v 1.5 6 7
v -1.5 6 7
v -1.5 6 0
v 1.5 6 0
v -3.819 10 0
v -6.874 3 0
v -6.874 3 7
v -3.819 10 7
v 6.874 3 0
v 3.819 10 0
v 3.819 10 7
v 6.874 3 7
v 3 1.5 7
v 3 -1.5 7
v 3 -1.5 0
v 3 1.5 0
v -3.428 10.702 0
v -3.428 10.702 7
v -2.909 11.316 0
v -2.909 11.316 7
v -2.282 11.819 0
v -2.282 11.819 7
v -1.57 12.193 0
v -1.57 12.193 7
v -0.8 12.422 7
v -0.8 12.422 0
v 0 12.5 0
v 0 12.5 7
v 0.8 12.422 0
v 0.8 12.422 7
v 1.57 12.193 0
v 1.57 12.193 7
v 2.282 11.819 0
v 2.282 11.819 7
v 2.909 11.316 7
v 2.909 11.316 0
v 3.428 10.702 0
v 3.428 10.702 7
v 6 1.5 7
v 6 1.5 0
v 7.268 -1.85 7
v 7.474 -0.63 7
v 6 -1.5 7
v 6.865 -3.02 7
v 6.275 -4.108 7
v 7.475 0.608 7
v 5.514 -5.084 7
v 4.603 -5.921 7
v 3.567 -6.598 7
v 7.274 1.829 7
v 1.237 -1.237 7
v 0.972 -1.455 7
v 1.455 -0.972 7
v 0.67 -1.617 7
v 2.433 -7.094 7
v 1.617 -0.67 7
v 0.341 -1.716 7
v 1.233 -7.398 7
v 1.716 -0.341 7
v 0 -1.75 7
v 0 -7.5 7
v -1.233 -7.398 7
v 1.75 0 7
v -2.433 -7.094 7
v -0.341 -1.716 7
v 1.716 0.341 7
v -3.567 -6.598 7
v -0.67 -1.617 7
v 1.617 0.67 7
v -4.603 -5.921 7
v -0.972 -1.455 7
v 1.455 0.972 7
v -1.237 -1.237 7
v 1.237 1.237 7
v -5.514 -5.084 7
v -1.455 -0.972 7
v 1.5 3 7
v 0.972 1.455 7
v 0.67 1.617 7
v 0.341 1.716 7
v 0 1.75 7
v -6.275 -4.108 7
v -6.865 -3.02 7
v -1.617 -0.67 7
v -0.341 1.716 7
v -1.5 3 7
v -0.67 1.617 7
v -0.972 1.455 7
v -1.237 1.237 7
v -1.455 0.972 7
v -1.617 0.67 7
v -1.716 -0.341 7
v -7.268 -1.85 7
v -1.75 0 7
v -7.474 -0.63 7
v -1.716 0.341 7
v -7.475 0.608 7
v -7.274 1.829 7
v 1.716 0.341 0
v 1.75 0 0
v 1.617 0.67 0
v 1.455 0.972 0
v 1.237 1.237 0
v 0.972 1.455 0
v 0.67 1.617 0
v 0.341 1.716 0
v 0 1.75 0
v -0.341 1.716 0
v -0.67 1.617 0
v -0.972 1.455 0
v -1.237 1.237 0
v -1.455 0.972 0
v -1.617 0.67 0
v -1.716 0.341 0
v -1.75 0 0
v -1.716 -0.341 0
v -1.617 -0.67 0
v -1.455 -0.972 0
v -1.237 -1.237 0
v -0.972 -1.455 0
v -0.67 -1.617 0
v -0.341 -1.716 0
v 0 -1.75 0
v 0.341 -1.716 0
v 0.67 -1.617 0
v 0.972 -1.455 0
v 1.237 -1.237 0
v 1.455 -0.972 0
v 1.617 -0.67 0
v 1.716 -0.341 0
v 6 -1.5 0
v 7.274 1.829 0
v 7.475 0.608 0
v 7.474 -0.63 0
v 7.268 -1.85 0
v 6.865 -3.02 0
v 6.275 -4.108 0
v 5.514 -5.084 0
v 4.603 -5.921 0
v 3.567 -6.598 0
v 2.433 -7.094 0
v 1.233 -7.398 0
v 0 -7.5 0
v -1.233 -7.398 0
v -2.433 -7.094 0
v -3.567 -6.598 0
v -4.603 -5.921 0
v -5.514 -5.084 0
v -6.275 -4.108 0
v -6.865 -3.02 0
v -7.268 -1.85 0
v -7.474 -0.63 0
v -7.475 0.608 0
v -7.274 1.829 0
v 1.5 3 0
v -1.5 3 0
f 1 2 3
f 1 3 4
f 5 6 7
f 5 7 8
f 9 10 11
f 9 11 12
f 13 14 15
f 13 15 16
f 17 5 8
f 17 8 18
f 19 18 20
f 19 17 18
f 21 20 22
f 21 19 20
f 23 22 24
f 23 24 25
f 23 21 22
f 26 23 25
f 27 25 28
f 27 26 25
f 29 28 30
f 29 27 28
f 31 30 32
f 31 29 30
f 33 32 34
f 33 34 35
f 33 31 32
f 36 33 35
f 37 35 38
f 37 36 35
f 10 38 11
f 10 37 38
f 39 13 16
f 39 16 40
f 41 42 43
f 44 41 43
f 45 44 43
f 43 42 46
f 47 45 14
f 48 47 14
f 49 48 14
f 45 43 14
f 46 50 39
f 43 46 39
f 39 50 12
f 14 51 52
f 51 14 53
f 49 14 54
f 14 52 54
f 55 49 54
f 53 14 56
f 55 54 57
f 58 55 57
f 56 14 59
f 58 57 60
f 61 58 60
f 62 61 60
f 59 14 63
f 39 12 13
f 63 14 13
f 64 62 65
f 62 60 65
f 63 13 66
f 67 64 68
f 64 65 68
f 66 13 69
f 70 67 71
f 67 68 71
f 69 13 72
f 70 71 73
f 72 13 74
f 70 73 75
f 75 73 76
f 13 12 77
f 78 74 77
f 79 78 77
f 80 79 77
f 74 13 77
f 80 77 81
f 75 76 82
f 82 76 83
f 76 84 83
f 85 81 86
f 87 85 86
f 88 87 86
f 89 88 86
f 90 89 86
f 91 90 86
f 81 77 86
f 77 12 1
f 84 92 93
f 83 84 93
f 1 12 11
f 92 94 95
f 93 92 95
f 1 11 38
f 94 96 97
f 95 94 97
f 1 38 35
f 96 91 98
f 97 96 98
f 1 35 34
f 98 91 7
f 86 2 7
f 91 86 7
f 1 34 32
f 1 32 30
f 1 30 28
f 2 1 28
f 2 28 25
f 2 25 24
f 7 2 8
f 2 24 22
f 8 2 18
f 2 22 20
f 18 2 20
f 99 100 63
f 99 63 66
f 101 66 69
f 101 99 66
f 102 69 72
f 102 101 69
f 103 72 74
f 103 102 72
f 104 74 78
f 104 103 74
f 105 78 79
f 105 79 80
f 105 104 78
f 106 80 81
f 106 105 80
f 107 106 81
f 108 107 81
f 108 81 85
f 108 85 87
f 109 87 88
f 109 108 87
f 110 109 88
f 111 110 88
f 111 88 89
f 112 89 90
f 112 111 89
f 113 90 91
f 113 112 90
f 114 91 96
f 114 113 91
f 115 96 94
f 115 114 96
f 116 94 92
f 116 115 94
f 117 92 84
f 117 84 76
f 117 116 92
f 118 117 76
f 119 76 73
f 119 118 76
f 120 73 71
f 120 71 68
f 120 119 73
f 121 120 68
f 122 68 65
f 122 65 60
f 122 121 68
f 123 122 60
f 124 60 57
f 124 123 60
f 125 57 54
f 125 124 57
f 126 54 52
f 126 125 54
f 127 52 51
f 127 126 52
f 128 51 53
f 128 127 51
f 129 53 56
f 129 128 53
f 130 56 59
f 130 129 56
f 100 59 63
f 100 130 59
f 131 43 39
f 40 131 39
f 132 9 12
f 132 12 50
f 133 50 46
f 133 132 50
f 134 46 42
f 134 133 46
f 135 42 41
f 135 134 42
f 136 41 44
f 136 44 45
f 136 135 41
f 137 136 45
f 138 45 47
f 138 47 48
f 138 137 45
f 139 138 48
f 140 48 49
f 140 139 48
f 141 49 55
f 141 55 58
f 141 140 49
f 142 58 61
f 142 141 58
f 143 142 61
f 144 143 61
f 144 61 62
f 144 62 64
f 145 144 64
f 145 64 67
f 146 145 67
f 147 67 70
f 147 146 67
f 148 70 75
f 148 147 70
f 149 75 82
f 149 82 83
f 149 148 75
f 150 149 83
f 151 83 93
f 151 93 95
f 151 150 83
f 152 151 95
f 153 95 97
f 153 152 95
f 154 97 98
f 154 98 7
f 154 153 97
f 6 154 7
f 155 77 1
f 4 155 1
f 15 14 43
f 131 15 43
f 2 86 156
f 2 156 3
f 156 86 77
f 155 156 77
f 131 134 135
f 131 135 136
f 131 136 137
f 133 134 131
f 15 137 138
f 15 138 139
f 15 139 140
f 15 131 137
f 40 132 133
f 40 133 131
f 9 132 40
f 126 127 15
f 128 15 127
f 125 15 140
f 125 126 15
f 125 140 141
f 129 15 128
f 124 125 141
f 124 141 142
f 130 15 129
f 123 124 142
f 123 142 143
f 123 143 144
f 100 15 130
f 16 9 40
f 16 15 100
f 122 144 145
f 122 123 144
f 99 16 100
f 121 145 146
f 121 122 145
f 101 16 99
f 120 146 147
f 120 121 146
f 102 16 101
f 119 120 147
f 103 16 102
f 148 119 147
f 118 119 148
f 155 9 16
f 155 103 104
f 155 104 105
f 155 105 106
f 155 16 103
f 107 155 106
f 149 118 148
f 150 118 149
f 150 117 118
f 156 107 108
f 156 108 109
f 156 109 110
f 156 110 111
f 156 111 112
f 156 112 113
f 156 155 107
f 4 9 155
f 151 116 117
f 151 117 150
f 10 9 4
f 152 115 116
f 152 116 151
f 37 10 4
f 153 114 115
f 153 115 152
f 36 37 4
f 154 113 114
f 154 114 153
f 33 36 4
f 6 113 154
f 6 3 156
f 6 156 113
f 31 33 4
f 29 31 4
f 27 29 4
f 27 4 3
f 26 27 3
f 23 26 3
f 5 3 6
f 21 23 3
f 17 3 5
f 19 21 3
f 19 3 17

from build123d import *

# Parameters (mm, degrees)
SKETCH1_R           = 1.75
BOSS_EXTRUDE1_DEPTH = 7
SKETCH2_W           = 3
SKETCH2_H           = 3
CUT_EXTRUDE1_DEPTH  = 17.170961629


with BuildPart() as part:
    # Sketch1 → Boss-Extrude1 (new body)
    with BuildSketch(Plane.XY):
        with BuildLine():
            Line((-6.873863542, 3), (-3.818813079, 10))
            ThreePointArc((-3.818813079, 10), (0, 12.5), (3.818813079, 10))
            Line((3.818813079, 10), (6.873863542, 3))
            ThreePointArc((6.873863542, 3), (0, -7.5), (-6.873863542, 3))
        make_face()
        Circle(SKETCH1_R, mode=Mode.SUBTRACT)
    extrude(amount=BOSS_EXTRUDE1_DEPTH)

    # Sketch2 → Cut-Extrude1 (cut, through all)
    with BuildSketch(Plane.XY.offset(7)):
        with Locations((0, 4.5)):
            Rectangle(SKETCH2_W, SKETCH2_H)
        with Locations((4.5, 0)):
            Rectangle(SKETCH2_W, SKETCH2_H)
    extrude(amount=-CUT_EXTRUDE1_DEPTH, mode=Mode.SUBTRACT)


solid = part.part
